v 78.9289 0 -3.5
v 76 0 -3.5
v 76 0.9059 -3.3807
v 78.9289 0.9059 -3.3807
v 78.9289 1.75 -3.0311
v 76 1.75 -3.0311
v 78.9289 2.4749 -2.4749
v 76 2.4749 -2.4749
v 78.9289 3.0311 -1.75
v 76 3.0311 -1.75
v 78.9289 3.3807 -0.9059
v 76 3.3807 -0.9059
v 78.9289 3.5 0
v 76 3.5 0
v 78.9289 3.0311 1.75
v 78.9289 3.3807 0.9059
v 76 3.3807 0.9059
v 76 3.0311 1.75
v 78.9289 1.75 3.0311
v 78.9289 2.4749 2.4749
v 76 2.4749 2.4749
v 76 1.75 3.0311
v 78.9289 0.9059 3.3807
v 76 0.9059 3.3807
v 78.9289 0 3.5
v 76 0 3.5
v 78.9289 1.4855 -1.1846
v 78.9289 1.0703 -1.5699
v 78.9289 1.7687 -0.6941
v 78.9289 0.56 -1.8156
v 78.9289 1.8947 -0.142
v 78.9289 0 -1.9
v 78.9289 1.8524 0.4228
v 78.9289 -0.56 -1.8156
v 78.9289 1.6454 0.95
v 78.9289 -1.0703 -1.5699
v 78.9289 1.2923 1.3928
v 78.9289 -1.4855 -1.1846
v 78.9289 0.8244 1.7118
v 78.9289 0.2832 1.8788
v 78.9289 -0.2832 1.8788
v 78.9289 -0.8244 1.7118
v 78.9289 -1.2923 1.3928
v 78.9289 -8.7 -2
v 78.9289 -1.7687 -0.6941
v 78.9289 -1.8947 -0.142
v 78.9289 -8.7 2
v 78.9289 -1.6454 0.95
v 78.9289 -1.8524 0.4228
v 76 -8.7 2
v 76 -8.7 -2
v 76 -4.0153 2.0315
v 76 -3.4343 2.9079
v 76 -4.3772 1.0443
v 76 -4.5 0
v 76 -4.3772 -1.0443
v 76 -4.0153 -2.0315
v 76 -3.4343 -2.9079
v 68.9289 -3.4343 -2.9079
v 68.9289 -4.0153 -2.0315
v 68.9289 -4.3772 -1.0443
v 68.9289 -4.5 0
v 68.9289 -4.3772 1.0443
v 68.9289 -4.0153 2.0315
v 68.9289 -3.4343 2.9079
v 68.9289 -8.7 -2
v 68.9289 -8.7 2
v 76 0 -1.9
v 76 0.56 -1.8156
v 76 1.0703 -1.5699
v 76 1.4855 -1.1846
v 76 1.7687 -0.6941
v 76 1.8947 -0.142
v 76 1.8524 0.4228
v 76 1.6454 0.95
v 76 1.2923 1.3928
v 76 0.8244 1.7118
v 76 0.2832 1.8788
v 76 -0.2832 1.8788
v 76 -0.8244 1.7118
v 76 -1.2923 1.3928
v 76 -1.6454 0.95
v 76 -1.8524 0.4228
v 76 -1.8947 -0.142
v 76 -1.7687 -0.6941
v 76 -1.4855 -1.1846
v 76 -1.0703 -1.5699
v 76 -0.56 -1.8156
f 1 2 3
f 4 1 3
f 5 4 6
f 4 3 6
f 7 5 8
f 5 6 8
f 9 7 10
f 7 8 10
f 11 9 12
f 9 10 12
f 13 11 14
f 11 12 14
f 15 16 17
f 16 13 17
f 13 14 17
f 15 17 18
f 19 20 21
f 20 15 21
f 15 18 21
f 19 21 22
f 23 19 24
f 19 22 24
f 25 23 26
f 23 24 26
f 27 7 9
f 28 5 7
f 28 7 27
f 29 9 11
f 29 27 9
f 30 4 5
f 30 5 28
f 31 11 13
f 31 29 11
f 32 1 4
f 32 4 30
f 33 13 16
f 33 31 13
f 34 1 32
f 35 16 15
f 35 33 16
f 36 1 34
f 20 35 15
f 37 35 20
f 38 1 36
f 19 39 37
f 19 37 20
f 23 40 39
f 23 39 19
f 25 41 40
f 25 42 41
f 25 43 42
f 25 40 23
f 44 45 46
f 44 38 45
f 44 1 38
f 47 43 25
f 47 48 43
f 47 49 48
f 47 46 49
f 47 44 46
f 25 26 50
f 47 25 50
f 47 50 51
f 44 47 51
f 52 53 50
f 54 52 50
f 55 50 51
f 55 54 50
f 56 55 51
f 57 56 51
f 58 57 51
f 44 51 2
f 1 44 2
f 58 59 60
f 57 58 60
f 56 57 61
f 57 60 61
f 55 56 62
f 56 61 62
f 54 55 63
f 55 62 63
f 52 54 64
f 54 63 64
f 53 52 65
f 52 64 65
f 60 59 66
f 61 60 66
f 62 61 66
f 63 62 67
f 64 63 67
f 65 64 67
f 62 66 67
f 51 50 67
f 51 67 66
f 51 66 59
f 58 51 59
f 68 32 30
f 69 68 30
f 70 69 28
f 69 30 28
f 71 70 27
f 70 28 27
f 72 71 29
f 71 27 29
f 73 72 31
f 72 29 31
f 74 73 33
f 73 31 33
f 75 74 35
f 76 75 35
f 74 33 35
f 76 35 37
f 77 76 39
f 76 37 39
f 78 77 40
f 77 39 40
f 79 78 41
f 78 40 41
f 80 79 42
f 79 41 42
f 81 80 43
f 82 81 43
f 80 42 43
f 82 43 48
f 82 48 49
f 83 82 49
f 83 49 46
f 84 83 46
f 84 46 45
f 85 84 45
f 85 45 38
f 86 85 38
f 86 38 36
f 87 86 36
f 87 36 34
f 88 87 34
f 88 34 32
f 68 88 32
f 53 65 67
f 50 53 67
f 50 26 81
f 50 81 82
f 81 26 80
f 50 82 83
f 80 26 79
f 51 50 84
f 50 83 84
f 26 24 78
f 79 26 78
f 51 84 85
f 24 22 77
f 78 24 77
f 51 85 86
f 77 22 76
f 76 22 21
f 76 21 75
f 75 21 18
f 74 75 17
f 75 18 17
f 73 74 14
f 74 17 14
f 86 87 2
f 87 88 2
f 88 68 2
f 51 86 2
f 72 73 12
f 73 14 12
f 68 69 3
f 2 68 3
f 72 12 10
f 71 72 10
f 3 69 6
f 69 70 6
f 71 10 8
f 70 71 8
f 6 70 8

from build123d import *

# Parameters (mm, degrees)
SKETCH1_R           = 1.9
BOSS_EXTRUDE1_DEPTH = 25
BOSS_EXTRUDE2_DEPTH = 51
SKETCH3_R           = 1.51
BOSS_EXTRUDE3_DEPTH = 25
SKETCH7_R           = 1.9
CUT_EXTRUDE4_DEPTH  = 102
SKETCH5_W           = 12.980873034
SKETCH5_H           = 17.196083227
CUT_EXTRUDE2_DEPTH  = 23.071112118
SKETCH6_W           = 13.016891784
SKETCH6_H           = 16.574206387
CUT_EXTRUDE3_DEPTH  = 69.928887882


with BuildPart() as part:
    # Sketch1 → Boss-Extrude1 (new body)
    with BuildSketch(Plane(origin=(0, 0, 0), x_dir=(0, 0, -1), z_dir=(1, 0, 0))):
        with BuildLine():
            Line((2, -8.7), (3.5, 0))
            ThreePointArc((3.5, 0), (0, 3.5), (-3.5, 0))
            Line((-3.5, 0), (-2, -8.7))
            Line((-2, -8.7), (2, -8.7))
        make_face()
        Circle(SKETCH1_R, mode=Mode.SUBTRACT)
    extrude(amount=BOSS_EXTRUDE1_DEPTH)

    # Sketch2 → Boss-Extrude2 (add)
    with BuildSketch(Plane(origin=(25, 0, 0), x_dir=(0, 0, -1), z_dir=(1, 0, 0))):
        with BuildLine():
            Line((-2, -8.7), (2, -8.7))
            Line((2, -8.7), (2.907884559, -3.434269557))
            ThreePointArc((2.907884559, -3.434269557), (0, -4.5), (-2.907884559, -3.434269557))
            Line((-2.907884559, -3.434269557), (-2, -8.7))
        make_face()
    extrude(amount=BOSS_EXTRUDE2_DEPTH)

    # Sketch6 → Cut-Extrude3 (cut, through all)
    with BuildSketch(Plane(origin=(68.928887882, 16.9, 1.27), x_dir=(0, 0, 1), z_dir=(1, 0, 0))):
        with Locations((-1.27, 20.639393127)):
            Rectangle(SKETCH6_W, SKETCH6_H)
    extrude(amount=-CUT_EXTRUDE3_DEPTH, mode=Mode.SUBTRACT)


with BuildPart() as body_2:
    # Sketch3 → Boss-Extrude3 (new body)
    with BuildSketch(Plane(origin=(76, 0, 0), x_dir=(0, 0, -1), z_dir=(1, 0, 0))):
        with BuildLine():
            Line((-3.5, 0), (-2, -8.7))
            Line((-2, -8.7), (2, -8.7))
            Line((2, -8.7), (3.5, 0))
            ThreePointArc((3.5, 0), (0, 3.5), (-3.5, 0))
        make_face()
        Circle(SKETCH3_R, mode=Mode.SUBTRACT)
    extrude(amount=BOSS_EXTRUDE3_DEPTH)

    # Sketch7 → Cut-Extrude4 (cut, through all)
    with BuildSketch(Plane(origin=(101, 0, 0), x_dir=(0, 0, -1), z_dir=(1, 0, 0))):
        Circle(SKETCH7_R)
    extrude(amount=-CUT_EXTRUDE4_DEPTH, mode=Mode.SUBTRACT)

    # Sketch5 → Cut-Extrude2 (cut, through all)
    with BuildSketch(Plane(origin=(78.928887882, 16.9, 1.27), x_dir=(0, 0, 1), z_dir=(1, 0, 0))):
        with Locations((-1.27, 20.925501883)):
            Rectangle(SKETCH5_W, SKETCH5_H)
    extrude(amount=CUT_EXTRUDE2_DEPTH, mode=Mode.SUBTRACT)


solid = Compound([part.part, body_2.part])
